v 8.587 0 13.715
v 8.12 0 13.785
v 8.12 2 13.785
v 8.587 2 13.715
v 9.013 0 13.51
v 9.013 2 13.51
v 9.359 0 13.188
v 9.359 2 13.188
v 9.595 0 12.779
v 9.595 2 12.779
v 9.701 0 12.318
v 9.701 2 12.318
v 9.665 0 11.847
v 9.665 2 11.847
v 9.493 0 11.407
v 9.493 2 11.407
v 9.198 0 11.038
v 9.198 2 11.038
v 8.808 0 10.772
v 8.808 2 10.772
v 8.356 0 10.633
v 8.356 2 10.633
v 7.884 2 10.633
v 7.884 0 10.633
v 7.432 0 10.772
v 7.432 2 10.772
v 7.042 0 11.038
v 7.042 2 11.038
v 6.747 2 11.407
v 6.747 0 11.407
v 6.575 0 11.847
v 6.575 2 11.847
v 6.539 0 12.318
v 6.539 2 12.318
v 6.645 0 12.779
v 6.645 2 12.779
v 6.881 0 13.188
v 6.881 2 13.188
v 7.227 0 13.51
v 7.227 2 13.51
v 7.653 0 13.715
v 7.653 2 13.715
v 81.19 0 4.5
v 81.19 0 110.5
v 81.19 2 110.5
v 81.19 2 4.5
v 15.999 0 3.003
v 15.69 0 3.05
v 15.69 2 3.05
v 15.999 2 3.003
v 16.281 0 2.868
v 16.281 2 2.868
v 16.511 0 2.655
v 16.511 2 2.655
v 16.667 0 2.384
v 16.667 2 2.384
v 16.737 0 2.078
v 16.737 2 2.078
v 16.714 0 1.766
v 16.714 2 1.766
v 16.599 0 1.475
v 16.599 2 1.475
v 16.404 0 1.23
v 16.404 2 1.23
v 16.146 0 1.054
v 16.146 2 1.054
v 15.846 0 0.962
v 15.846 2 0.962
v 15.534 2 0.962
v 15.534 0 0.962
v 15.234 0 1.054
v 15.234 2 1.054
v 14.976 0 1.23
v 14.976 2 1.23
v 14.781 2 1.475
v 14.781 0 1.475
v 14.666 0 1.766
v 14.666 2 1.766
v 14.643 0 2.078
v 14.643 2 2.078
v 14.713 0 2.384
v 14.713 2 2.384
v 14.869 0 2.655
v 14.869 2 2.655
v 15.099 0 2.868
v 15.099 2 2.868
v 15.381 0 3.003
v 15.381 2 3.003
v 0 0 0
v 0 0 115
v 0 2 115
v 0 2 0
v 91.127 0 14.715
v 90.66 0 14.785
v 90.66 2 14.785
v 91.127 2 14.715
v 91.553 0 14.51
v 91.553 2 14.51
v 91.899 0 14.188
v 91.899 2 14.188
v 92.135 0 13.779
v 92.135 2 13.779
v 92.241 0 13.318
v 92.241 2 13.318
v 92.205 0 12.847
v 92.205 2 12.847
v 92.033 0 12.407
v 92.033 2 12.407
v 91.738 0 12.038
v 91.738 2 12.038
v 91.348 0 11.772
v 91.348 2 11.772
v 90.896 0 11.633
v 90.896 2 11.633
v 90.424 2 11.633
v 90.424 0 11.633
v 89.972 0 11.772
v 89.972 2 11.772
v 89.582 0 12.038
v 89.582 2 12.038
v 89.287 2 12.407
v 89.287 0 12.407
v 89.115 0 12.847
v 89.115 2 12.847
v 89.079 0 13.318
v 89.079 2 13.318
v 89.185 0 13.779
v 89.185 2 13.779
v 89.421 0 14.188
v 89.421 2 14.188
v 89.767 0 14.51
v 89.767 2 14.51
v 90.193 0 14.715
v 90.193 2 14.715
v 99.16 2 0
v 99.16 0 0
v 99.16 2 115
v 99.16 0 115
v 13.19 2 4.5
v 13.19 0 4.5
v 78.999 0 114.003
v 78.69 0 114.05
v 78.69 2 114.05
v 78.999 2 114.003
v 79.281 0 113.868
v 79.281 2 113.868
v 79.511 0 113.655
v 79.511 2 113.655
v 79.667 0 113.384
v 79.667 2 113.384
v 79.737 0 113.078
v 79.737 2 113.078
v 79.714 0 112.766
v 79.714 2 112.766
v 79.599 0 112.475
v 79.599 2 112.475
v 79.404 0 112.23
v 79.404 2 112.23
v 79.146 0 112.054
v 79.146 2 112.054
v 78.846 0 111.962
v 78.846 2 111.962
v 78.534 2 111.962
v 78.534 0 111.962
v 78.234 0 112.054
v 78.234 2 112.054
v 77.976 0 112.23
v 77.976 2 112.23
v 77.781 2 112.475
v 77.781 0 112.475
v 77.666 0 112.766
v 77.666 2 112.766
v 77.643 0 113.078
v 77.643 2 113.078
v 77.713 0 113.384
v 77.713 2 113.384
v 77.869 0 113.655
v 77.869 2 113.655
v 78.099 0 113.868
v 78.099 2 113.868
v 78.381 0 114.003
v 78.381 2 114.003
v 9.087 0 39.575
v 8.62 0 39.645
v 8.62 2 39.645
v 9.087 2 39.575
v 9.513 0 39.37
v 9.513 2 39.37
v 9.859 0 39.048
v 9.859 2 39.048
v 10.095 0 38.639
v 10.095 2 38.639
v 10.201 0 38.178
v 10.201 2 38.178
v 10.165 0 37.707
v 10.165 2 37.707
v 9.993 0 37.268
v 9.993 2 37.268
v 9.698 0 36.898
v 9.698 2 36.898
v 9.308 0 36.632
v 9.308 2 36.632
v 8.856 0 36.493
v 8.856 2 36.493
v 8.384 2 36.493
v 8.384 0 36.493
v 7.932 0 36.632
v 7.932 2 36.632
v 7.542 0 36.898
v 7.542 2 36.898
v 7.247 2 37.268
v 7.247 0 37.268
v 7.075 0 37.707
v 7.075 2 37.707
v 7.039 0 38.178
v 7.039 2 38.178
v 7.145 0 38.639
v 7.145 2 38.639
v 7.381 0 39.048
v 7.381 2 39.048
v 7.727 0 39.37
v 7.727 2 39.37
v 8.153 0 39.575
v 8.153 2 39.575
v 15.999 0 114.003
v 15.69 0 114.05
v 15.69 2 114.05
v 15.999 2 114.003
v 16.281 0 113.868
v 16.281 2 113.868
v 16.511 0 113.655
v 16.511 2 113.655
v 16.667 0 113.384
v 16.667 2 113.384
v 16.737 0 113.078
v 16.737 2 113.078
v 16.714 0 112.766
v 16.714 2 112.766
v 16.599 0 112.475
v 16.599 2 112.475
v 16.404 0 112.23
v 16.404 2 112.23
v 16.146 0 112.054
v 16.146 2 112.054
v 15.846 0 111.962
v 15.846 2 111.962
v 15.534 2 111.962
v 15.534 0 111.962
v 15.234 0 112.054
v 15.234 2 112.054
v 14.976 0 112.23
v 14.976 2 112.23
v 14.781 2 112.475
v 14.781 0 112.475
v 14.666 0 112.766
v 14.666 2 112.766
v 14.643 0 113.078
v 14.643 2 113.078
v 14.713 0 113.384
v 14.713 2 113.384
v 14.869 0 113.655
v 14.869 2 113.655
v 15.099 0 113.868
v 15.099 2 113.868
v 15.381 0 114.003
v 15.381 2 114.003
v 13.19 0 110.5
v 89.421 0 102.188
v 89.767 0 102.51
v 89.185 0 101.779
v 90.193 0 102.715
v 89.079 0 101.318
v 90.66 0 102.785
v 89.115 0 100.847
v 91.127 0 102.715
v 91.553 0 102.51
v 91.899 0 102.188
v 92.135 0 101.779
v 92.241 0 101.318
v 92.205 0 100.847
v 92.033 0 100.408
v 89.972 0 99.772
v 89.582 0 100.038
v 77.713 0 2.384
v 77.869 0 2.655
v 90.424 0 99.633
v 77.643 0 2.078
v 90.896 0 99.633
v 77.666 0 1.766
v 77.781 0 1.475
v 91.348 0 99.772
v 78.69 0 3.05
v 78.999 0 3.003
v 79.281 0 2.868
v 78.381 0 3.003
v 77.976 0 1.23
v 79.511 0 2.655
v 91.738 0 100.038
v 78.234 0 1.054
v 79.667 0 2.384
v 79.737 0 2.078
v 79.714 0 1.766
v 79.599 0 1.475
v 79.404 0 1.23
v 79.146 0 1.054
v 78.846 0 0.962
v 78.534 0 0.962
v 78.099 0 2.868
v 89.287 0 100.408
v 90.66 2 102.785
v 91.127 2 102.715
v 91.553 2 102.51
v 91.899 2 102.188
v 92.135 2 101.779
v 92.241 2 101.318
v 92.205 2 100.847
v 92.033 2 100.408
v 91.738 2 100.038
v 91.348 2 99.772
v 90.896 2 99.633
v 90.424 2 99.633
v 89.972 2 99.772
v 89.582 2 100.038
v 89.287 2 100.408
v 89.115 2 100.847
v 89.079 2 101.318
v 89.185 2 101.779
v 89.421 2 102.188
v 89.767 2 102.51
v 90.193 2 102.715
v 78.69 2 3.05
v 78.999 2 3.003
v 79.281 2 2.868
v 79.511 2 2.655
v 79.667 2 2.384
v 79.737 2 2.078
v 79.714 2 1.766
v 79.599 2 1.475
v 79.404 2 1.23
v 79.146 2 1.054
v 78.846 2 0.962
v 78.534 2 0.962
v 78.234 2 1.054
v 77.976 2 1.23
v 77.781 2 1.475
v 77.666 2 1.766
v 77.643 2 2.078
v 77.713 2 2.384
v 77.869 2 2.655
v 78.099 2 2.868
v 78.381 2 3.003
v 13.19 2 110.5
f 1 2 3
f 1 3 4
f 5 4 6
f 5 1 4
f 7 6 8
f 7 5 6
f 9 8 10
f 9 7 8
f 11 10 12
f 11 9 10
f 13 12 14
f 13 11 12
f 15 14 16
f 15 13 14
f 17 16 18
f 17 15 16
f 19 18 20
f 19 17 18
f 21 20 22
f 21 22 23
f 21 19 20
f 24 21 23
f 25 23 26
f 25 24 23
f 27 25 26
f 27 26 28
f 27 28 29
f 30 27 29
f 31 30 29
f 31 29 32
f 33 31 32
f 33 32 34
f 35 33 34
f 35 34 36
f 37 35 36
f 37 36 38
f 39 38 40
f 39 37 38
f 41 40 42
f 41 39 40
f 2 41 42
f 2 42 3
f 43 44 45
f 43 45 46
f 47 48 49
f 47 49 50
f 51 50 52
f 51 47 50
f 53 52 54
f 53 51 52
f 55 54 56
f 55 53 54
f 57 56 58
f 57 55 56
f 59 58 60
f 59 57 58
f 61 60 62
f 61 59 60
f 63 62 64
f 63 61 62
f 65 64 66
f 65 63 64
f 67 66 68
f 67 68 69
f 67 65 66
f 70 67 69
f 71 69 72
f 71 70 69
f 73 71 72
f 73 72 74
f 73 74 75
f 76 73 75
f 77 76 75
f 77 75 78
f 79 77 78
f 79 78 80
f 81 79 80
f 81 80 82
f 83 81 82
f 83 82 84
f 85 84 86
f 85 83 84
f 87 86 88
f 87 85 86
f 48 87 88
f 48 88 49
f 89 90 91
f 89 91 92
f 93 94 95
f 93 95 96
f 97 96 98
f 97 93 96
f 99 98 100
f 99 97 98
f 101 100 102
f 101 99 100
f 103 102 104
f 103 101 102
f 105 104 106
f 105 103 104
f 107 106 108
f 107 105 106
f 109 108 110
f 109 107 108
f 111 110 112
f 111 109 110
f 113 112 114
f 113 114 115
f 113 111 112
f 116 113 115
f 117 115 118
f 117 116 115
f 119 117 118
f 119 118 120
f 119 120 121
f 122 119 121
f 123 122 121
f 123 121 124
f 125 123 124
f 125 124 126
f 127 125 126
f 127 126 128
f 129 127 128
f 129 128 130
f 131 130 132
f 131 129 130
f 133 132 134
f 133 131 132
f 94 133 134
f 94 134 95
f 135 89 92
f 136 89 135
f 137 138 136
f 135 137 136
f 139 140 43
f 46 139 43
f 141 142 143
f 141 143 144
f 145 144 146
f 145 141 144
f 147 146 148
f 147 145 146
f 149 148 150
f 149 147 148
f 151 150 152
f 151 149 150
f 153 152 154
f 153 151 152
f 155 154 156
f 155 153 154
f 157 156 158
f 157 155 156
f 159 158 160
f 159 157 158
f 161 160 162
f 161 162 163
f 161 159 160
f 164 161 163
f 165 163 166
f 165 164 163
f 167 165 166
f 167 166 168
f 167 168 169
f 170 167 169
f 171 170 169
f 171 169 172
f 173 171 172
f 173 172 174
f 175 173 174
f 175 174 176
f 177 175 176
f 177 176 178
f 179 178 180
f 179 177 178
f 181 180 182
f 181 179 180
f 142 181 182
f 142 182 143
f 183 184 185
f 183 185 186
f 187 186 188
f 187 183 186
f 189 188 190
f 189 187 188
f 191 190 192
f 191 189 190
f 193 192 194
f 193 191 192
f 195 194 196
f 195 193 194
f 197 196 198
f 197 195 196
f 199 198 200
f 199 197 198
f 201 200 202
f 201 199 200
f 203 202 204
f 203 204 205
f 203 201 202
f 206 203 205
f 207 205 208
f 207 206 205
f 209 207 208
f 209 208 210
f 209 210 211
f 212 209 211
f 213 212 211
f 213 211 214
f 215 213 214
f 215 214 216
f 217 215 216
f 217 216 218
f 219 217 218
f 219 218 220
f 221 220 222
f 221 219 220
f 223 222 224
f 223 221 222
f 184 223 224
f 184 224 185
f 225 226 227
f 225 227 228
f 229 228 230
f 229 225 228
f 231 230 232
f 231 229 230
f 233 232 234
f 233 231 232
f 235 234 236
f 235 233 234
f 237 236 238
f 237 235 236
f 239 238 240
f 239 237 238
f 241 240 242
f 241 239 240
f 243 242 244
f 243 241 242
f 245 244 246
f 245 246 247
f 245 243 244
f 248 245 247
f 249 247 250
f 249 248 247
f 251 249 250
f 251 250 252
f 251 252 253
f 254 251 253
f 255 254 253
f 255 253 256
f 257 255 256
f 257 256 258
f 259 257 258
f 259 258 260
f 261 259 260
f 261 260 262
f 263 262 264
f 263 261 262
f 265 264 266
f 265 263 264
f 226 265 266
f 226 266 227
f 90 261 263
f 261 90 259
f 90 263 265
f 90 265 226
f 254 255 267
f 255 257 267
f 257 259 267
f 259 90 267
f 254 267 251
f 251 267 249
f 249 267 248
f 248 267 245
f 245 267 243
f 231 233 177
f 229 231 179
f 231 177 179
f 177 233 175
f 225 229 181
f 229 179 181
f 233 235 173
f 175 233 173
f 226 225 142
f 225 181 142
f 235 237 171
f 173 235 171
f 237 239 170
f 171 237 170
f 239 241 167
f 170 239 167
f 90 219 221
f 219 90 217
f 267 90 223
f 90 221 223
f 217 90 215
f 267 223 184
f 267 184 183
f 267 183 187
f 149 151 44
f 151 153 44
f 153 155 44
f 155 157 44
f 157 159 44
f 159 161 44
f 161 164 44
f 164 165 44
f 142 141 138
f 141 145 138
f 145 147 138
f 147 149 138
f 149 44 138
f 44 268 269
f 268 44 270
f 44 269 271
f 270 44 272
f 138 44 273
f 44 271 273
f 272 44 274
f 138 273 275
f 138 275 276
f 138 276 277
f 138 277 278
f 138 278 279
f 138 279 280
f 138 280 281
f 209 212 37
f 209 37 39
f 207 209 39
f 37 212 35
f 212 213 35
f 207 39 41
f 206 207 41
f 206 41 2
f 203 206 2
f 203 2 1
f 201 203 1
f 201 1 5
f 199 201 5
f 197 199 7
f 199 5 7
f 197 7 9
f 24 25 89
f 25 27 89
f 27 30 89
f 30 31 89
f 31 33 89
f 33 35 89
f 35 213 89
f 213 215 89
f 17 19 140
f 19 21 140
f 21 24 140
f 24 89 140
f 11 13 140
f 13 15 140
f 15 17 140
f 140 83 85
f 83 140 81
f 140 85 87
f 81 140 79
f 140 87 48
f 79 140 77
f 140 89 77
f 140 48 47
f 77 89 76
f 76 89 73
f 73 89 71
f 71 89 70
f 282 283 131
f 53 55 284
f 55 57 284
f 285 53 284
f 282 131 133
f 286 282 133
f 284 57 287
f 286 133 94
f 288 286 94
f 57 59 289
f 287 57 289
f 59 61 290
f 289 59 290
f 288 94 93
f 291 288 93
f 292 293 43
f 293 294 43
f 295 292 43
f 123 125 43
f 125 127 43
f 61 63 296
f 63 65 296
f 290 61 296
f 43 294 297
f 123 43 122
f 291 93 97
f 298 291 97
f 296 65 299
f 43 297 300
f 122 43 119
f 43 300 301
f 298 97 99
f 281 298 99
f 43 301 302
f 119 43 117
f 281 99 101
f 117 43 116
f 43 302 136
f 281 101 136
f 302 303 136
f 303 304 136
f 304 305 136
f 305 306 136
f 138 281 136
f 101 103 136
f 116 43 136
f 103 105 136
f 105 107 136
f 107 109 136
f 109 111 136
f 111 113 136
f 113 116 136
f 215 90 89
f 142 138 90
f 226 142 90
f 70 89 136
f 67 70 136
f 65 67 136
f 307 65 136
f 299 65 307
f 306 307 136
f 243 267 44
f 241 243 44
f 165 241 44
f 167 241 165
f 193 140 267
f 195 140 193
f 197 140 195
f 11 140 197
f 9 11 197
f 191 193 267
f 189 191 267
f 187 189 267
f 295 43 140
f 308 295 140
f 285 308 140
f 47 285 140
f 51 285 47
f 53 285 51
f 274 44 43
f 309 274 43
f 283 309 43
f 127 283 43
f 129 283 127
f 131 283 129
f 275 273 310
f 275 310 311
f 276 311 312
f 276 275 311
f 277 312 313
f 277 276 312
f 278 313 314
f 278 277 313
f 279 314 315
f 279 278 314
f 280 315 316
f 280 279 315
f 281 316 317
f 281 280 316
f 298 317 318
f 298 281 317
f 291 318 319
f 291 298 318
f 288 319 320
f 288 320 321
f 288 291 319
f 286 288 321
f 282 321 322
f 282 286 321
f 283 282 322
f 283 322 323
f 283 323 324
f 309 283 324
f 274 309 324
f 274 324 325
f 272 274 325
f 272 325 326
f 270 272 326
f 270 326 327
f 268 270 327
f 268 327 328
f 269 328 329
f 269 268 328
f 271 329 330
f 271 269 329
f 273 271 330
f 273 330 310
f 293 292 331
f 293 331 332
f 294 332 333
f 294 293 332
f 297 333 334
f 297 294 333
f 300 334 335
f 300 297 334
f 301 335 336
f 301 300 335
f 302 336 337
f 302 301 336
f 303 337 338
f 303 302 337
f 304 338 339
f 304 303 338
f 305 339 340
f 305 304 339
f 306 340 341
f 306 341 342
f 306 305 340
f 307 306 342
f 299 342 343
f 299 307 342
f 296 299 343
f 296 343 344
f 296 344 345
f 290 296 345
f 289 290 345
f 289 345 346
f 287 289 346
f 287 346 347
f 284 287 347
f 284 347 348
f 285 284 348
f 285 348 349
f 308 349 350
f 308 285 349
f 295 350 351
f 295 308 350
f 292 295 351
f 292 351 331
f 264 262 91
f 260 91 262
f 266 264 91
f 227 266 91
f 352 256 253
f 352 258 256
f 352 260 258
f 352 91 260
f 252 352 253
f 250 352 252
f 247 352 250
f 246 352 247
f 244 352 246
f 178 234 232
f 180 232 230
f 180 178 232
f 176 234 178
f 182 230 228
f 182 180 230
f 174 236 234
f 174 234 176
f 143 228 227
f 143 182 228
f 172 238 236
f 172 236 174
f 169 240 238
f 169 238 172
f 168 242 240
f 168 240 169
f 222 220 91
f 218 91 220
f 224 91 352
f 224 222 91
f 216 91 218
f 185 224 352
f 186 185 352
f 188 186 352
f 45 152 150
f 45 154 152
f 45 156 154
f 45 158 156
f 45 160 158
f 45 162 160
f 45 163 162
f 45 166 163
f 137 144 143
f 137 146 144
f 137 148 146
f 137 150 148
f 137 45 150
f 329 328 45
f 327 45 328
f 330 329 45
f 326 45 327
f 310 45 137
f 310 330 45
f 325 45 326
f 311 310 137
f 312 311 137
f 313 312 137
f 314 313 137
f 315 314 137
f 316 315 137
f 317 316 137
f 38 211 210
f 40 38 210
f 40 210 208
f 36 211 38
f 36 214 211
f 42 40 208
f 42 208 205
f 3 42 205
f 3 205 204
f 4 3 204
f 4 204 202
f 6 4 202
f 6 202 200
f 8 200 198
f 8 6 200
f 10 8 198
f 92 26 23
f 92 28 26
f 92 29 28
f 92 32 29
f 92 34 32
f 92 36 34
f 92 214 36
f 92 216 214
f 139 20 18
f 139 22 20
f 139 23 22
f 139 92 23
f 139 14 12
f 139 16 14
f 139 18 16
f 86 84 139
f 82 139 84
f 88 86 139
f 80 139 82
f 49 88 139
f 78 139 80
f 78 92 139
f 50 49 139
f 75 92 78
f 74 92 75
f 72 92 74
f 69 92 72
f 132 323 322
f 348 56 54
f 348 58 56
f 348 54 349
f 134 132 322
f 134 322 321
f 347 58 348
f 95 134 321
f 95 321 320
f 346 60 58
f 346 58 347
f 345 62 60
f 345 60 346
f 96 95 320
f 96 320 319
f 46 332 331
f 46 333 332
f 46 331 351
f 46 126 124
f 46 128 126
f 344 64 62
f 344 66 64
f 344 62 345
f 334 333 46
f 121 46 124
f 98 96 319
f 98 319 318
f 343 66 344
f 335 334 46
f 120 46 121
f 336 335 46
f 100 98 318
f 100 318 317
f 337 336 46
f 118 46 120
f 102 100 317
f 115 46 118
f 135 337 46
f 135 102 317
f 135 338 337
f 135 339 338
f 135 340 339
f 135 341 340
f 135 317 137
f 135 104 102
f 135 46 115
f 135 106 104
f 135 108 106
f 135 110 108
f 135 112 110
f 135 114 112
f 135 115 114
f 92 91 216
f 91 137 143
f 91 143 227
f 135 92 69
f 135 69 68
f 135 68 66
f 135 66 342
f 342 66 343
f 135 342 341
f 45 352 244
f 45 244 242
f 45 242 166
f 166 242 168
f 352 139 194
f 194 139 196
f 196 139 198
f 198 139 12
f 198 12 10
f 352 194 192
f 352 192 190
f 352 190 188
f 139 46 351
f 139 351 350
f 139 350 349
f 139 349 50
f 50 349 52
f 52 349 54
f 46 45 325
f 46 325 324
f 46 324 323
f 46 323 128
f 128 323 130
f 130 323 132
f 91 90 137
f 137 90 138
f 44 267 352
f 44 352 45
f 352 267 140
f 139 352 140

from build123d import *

# Parameters (mm, degrees)
SKETCH_1_W      = 99.16
SKETCH_1_H      = 115
SKETCH_1_R      = 1.585
SKETCH_1_R_2    = 1.05
SKETCH_1_W_2    = 68
SKETCH_1_H_2    = 106
EXTRUDE_1_DEPTH = 2


with BuildPart() as part:
    # 草图1 → 凸台-拉伸1 (new body)
    with BuildSketch(Plane(origin=(0, 0, 0), x_dir=(1, 0, 0), z_dir=(0, 1, 0))):
        with Locations((49.58, -57.5)):
            Rectangle(SKETCH_1_W, SKETCH_1_H)
        with Locations(Location((90.66, -13.2, 0), (0, 0, 270))):
            Circle(SKETCH_1_R, mode=Mode.SUBTRACT)
        with Locations(Location((90.66, -101.2, 0), (0, 0, 270))):
            Circle(SKETCH_1_R, mode=Mode.SUBTRACT)
        with Locations(Location((8.12, -12.2, 0), (0, 0, 270))):
            Circle(SKETCH_1_R, mode=Mode.SUBTRACT)
        with Locations(Location((8.62, -38.06, 0), (0, 0, 270))):
            Circle(SKETCH_1_R, mode=Mode.SUBTRACT)
        with Locations(Location((15.69, -2, 0), (0, 0, 270))):
            Circle(SKETCH_1_R_2, mode=Mode.SUBTRACT)
        with Locations(Location((78.69, -2, 0), (0, 0, 270))):
            Circle(SKETCH_1_R_2, mode=Mode.SUBTRACT)
        with Locations(Location((15.69, -113, 0), (0, 0, 270))):
            Circle(SKETCH_1_R_2, mode=Mode.SUBTRACT)
        with Locations(Location((78.69, -113, 0), (0, 0, 270))):
            Circle(SKETCH_1_R_2, mode=Mode.SUBTRACT)
        with Locations((47.19, -57.5)):
            Rectangle(SKETCH_1_W_2, SKETCH_1_H_2, mode=Mode.SUBTRACT)
    extrude(amount=EXTRUDE_1_DEPTH)


solid = part.part
